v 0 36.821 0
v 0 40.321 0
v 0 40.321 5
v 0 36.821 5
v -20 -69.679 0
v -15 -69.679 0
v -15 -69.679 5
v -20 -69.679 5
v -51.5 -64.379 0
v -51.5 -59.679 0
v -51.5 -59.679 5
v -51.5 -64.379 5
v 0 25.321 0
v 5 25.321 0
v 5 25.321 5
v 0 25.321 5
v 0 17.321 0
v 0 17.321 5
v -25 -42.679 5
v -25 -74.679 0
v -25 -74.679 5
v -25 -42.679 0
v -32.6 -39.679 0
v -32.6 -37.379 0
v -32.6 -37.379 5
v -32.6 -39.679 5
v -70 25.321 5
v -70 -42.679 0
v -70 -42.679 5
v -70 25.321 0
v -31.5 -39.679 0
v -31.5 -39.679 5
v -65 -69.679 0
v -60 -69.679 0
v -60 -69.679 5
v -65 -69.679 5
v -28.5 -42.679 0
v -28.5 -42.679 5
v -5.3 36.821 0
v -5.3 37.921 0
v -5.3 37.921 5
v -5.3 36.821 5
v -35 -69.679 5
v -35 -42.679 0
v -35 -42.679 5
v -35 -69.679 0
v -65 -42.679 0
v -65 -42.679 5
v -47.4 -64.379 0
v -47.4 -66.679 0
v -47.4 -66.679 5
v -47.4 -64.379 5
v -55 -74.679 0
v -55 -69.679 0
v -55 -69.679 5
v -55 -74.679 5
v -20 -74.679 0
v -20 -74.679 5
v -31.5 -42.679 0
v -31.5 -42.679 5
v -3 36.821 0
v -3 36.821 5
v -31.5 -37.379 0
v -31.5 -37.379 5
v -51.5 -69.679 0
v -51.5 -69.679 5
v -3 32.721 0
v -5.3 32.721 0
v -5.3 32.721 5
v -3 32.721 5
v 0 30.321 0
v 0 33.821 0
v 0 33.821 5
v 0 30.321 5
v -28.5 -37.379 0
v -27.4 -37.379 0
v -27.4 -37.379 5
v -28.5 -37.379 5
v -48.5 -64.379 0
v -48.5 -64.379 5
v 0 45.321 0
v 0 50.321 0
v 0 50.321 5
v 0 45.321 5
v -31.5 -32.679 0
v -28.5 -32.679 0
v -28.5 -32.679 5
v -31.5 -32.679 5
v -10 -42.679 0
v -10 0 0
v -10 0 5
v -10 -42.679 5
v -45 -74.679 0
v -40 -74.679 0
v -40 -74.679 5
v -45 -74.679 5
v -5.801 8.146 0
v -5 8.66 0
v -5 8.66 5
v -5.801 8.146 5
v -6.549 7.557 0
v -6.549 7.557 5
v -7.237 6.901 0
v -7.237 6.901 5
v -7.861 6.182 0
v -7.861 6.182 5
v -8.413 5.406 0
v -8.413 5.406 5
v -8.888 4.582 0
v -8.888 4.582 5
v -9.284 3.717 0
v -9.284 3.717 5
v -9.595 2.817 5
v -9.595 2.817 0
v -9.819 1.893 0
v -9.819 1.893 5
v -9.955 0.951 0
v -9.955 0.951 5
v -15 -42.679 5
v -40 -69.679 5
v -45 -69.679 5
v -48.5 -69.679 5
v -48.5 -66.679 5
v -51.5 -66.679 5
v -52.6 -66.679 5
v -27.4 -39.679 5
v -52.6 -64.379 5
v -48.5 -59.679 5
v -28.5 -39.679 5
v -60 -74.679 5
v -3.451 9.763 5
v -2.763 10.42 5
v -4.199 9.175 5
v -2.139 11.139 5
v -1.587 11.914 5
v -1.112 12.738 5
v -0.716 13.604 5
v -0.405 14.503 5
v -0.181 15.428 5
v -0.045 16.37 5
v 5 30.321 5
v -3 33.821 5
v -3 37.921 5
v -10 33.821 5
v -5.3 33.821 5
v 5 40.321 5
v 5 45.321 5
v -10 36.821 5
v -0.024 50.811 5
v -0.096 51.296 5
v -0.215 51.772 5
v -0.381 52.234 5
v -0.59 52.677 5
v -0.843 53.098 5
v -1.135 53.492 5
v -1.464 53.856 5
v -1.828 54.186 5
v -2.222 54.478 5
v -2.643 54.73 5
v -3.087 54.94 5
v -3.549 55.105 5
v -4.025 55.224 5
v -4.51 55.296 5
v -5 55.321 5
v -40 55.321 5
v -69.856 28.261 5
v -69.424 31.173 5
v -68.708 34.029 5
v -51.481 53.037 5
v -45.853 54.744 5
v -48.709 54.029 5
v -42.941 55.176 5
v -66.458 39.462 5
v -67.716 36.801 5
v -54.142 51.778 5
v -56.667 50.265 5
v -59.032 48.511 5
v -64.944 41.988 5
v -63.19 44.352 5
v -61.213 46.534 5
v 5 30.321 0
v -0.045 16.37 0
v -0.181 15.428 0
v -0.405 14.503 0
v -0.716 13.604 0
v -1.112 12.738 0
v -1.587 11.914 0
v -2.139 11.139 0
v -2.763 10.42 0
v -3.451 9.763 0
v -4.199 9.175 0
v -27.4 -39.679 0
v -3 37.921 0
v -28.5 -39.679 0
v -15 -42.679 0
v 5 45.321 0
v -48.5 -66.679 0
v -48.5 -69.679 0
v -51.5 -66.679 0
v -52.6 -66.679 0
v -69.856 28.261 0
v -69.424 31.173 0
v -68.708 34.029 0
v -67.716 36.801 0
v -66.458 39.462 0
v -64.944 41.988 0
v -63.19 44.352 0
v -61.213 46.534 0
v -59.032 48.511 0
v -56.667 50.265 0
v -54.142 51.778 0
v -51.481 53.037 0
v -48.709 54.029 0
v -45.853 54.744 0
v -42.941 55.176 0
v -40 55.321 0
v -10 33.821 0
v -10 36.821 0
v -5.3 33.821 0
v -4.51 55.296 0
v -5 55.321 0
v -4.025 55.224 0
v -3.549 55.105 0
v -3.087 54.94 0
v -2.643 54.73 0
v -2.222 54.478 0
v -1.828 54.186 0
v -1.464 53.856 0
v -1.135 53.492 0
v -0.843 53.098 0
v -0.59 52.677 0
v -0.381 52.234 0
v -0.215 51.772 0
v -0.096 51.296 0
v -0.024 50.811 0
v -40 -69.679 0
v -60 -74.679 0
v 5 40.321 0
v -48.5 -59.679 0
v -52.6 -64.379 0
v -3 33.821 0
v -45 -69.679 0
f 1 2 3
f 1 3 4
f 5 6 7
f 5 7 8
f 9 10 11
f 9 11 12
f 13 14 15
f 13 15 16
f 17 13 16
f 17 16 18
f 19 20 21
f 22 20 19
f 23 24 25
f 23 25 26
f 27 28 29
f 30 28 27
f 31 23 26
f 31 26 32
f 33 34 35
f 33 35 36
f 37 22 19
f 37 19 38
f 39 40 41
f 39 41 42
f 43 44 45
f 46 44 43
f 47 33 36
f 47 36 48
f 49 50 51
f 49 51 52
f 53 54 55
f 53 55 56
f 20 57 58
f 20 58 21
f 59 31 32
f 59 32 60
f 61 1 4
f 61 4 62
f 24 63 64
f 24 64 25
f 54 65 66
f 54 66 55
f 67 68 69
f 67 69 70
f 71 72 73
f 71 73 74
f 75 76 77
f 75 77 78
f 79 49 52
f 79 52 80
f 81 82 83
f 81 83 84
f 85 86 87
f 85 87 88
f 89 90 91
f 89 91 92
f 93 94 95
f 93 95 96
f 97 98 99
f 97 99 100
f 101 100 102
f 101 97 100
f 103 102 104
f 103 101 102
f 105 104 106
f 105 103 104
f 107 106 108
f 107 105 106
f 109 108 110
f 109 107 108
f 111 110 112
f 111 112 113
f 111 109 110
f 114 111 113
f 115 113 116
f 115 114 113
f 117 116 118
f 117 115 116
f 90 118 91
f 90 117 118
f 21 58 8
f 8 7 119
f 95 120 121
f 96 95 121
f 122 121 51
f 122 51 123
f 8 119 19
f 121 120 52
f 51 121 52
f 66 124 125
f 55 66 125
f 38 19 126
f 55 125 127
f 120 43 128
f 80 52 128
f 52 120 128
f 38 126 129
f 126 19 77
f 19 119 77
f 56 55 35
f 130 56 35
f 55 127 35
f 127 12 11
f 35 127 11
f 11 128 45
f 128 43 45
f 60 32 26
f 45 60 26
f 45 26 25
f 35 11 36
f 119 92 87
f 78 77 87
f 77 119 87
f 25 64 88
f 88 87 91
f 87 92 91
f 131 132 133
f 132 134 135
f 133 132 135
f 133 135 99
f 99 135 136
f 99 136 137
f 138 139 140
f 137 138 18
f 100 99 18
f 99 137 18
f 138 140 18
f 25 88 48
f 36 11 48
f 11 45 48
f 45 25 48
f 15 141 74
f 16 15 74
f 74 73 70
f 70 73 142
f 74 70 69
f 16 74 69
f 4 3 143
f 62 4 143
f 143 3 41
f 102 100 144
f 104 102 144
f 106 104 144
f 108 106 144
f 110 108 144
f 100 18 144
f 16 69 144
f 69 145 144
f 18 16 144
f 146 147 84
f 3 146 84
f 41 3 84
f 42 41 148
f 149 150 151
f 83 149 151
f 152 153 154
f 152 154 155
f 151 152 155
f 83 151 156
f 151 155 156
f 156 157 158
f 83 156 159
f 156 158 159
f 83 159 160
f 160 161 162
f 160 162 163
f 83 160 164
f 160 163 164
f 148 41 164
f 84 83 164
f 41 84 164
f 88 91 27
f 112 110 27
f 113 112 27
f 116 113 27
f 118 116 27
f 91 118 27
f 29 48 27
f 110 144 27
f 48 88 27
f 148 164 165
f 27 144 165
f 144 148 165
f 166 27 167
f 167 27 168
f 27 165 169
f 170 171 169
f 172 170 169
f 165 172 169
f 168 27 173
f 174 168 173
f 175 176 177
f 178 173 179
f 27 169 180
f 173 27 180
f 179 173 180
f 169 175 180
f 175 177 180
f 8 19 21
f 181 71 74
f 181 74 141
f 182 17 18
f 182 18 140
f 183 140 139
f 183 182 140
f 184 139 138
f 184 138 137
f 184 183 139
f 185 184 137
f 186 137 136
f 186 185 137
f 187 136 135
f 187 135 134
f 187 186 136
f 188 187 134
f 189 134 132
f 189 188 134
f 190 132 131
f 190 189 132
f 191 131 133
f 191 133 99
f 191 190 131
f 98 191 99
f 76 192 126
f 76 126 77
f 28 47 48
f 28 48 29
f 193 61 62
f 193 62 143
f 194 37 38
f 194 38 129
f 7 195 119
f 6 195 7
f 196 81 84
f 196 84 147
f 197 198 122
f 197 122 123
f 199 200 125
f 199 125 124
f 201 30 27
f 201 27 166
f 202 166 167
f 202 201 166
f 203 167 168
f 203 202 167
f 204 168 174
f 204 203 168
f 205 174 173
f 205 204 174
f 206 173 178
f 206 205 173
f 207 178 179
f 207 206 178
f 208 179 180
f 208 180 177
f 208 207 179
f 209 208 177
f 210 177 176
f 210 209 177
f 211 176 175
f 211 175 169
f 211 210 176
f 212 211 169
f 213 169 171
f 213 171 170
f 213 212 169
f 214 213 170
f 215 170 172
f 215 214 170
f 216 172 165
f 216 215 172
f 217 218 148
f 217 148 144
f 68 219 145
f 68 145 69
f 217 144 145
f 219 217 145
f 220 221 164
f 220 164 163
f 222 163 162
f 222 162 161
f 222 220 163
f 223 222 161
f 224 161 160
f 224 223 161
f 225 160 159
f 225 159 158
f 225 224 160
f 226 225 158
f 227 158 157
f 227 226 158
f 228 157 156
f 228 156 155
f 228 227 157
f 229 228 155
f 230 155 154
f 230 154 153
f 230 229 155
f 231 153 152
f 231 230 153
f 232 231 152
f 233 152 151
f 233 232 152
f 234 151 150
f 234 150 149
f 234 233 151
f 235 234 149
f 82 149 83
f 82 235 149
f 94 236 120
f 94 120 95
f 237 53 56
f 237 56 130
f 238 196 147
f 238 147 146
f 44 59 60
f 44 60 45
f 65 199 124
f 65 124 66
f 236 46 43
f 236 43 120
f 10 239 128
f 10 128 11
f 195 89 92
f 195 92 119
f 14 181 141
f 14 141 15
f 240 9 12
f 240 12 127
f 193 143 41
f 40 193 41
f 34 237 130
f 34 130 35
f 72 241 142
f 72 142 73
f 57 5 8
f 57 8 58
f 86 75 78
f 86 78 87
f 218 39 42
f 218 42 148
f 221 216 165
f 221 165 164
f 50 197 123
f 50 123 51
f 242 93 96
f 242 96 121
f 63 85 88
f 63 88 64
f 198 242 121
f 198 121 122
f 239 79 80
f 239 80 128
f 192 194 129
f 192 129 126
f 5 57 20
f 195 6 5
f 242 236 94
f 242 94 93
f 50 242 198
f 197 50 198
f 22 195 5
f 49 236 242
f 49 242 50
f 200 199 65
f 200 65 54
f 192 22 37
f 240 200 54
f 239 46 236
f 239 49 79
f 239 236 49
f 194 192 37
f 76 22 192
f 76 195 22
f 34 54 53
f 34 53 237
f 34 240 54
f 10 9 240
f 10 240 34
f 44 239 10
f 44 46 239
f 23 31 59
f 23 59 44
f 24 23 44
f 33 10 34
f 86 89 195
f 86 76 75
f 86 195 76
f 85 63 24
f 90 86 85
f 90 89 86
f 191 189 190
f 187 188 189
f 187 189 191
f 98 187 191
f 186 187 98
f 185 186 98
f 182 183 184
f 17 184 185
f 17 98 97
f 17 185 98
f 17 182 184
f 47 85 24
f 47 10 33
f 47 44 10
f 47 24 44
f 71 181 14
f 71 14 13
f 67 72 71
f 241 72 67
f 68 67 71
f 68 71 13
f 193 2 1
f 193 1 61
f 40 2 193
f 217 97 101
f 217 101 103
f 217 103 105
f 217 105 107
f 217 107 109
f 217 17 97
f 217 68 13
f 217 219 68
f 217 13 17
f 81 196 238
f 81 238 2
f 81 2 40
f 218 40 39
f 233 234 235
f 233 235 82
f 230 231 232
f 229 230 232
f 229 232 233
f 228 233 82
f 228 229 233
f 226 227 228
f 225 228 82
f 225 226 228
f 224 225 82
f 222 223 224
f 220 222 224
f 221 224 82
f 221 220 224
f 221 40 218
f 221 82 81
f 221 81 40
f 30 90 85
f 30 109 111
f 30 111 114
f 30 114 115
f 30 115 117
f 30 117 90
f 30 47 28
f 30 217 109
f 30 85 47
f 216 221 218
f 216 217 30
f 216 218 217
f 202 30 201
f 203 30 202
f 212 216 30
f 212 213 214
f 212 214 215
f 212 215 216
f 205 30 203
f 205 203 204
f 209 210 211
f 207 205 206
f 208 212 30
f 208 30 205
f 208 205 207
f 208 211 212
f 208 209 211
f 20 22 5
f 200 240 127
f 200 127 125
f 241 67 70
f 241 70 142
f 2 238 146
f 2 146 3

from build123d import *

# Parameters (mm, degrees)
BOSS_EXTRU_1_DEPTH = 5


with BuildPart() as part:
    # Esquisse1 → Boss.-Extru.1 (new body)
    with BuildSketch(Plane.XY):
        with BuildLine():
            Line((-10, 0), (-10, -42.679491924))
            Line((-10, -42.679491924), (-15, -42.679491924))
            Line((-15, -42.679491924), (-15, -69.679491924))
            Line((-15, -69.679491924), (-20, -69.679491924))
            Line((-20, -69.679491924), (-20, -74.679491924))
            Line((-20, -74.679491924), (-25, -74.679491924))
            Line((-25, -74.679491924), (-25, -42.679491924))
            Line((-25, -42.679491924), (-28.5, -42.679491924))
            Line((-28.5, -42.679491924), (-28.5, -39.679491924))
            Line((-28.5, -39.679491924), (-27.4, -39.679491924))
            Line((-27.4, -39.679491924), (-27.4, -37.379491924))
            Line((-27.4, -37.379491924), (-28.5, -37.379491924))
            Line((-28.5, -37.379491924), (-28.5, -32.679491924))
            Line((-28.5, -32.679491924), (-31.5, -32.679491924))
            Line((-31.5, -32.679491924), (-31.5, -37.379491924))
            Line((-31.5, -37.379491924), (-32.6, -37.379491924))
            Line((-32.6, -37.379491924), (-32.6, -39.679491924))
            Line((-32.6, -39.679491924), (-31.5, -39.679491924))
            Line((-31.5, -39.679491924), (-31.5, -42.679491924))
            Line((-31.5, -42.679491924), (-35, -42.679491924))
            Line((-35, -42.679491924), (-35, -69.679491924))
            Line((-35, -69.679491924), (-40, -69.679491924))
            Line((-40, -69.679491924), (-40, -74.679491924))
            Line((-40, -74.679491924), (-45, -74.679491924))
            Line((-45, -74.679491924), (-45, -69.679491924))
            Line((-45, -69.679491924), (-48.5, -69.679491924))
            Line((-48.5, -69.679491924), (-48.5, -66.679491924))
            Line((-48.5, -66.679491924), (-47.4, -66.679491924))
            Line((-47.4, -66.679491924), (-47.4, -64.379491924))
            Line((-47.4, -64.379491924), (-48.5, -64.379491924))
            Line((-48.5, -64.379491924), (-48.5, -59.679491924))
            Line((-48.5, -59.679491924), (-51.5, -59.679491924))
            Line((-51.5, -59.679491924), (-51.5, -64.379491924))
            Line((-51.5, -64.379491924), (-52.6, -64.379491924))
            Line((-52.6, -64.379491924), (-52.6, -66.679491924))
            Line((-52.6, -66.679491924), (-51.5, -66.679491924))
            Line((-51.5, -66.679491924), (-51.5, -69.679491924))
            Line((-51.5, -69.679491924), (-55, -69.679491924))
            Line((-55, -69.679491924), (-55, -74.679491924))
            Line((-55, -74.679491924), (-60, -74.679491924))
            Line((-60, -74.679491924), (-60, -69.679491924))
            Line((-60, -69.679491924), (-65, -69.679491924))
            Line((-65, -69.679491924), (-65, -42.679491924))
            Line((-65, -42.679491924), (-70, -42.679491924))
            Line((-70, -42.679491924), (-70, 25.320508076))
            ThreePointArc((-70, 25.320508076), (-61.213203436, 46.533711511), (-40, 55.320508076))
            Line((-40, 55.320508076), (-5, 55.320508076))
            ThreePointArc((-5, 55.320508076), (-1.464466094, 53.856041982), (0, 50.320508076))
            Line((0, 50.320508076), (0, 45.320508076))
            Line((0, 45.320508076), (5, 45.320508076))
            Line((5, 45.320508076), (5, 40.320508076))
            Line((5, 40.320508076), (0, 40.320508076))
            Line((0, 40.320508076), (0, 36.820508076))
            Line((0, 36.820508076), (-3, 36.820508076))
            Line((-3, 36.820508076), (-3, 37.920508076))
            Line((-3, 37.920508076), (-5.3, 37.920508076))
            Line((-5.3, 37.920508076), (-5.3, 36.820508076))
            Line((-5.3, 36.820508076), (-10, 36.820508076))
            Line((-10, 36.820508076), (-10, 33.820508076))
            Line((-10, 33.820508076), (-5.3, 33.820508076))
            Line((-5.3, 33.820508076), (-5.3, 32.720508076))
            Line((-5.3, 32.720508076), (-3, 32.720508076))
            Line((-3, 32.720508076), (-3, 33.820508076))
            Line((-3, 33.820508076), (0, 33.820508076))
            Line((0, 33.820508076), (0, 30.320508076))
            Line((0, 30.320508076), (5, 30.320508076))
            Line((5, 30.320508076), (5, 25.320508076))
            Line((5, 25.320508076), (0, 25.320508076))
            Line((0, 25.320508076), (0, 17.320508076))
            ThreePointArc((0, 17.320508076), (-1.339745962, 12.320508076), (-5, 8.660254038))
            ThreePointArc((-5, 8.660254038), (-8.660254038, 5), (-10, 0))
        make_face()
    extrude(amount=BOSS_EXTRU_1_DEPTH)


solid = part.part
